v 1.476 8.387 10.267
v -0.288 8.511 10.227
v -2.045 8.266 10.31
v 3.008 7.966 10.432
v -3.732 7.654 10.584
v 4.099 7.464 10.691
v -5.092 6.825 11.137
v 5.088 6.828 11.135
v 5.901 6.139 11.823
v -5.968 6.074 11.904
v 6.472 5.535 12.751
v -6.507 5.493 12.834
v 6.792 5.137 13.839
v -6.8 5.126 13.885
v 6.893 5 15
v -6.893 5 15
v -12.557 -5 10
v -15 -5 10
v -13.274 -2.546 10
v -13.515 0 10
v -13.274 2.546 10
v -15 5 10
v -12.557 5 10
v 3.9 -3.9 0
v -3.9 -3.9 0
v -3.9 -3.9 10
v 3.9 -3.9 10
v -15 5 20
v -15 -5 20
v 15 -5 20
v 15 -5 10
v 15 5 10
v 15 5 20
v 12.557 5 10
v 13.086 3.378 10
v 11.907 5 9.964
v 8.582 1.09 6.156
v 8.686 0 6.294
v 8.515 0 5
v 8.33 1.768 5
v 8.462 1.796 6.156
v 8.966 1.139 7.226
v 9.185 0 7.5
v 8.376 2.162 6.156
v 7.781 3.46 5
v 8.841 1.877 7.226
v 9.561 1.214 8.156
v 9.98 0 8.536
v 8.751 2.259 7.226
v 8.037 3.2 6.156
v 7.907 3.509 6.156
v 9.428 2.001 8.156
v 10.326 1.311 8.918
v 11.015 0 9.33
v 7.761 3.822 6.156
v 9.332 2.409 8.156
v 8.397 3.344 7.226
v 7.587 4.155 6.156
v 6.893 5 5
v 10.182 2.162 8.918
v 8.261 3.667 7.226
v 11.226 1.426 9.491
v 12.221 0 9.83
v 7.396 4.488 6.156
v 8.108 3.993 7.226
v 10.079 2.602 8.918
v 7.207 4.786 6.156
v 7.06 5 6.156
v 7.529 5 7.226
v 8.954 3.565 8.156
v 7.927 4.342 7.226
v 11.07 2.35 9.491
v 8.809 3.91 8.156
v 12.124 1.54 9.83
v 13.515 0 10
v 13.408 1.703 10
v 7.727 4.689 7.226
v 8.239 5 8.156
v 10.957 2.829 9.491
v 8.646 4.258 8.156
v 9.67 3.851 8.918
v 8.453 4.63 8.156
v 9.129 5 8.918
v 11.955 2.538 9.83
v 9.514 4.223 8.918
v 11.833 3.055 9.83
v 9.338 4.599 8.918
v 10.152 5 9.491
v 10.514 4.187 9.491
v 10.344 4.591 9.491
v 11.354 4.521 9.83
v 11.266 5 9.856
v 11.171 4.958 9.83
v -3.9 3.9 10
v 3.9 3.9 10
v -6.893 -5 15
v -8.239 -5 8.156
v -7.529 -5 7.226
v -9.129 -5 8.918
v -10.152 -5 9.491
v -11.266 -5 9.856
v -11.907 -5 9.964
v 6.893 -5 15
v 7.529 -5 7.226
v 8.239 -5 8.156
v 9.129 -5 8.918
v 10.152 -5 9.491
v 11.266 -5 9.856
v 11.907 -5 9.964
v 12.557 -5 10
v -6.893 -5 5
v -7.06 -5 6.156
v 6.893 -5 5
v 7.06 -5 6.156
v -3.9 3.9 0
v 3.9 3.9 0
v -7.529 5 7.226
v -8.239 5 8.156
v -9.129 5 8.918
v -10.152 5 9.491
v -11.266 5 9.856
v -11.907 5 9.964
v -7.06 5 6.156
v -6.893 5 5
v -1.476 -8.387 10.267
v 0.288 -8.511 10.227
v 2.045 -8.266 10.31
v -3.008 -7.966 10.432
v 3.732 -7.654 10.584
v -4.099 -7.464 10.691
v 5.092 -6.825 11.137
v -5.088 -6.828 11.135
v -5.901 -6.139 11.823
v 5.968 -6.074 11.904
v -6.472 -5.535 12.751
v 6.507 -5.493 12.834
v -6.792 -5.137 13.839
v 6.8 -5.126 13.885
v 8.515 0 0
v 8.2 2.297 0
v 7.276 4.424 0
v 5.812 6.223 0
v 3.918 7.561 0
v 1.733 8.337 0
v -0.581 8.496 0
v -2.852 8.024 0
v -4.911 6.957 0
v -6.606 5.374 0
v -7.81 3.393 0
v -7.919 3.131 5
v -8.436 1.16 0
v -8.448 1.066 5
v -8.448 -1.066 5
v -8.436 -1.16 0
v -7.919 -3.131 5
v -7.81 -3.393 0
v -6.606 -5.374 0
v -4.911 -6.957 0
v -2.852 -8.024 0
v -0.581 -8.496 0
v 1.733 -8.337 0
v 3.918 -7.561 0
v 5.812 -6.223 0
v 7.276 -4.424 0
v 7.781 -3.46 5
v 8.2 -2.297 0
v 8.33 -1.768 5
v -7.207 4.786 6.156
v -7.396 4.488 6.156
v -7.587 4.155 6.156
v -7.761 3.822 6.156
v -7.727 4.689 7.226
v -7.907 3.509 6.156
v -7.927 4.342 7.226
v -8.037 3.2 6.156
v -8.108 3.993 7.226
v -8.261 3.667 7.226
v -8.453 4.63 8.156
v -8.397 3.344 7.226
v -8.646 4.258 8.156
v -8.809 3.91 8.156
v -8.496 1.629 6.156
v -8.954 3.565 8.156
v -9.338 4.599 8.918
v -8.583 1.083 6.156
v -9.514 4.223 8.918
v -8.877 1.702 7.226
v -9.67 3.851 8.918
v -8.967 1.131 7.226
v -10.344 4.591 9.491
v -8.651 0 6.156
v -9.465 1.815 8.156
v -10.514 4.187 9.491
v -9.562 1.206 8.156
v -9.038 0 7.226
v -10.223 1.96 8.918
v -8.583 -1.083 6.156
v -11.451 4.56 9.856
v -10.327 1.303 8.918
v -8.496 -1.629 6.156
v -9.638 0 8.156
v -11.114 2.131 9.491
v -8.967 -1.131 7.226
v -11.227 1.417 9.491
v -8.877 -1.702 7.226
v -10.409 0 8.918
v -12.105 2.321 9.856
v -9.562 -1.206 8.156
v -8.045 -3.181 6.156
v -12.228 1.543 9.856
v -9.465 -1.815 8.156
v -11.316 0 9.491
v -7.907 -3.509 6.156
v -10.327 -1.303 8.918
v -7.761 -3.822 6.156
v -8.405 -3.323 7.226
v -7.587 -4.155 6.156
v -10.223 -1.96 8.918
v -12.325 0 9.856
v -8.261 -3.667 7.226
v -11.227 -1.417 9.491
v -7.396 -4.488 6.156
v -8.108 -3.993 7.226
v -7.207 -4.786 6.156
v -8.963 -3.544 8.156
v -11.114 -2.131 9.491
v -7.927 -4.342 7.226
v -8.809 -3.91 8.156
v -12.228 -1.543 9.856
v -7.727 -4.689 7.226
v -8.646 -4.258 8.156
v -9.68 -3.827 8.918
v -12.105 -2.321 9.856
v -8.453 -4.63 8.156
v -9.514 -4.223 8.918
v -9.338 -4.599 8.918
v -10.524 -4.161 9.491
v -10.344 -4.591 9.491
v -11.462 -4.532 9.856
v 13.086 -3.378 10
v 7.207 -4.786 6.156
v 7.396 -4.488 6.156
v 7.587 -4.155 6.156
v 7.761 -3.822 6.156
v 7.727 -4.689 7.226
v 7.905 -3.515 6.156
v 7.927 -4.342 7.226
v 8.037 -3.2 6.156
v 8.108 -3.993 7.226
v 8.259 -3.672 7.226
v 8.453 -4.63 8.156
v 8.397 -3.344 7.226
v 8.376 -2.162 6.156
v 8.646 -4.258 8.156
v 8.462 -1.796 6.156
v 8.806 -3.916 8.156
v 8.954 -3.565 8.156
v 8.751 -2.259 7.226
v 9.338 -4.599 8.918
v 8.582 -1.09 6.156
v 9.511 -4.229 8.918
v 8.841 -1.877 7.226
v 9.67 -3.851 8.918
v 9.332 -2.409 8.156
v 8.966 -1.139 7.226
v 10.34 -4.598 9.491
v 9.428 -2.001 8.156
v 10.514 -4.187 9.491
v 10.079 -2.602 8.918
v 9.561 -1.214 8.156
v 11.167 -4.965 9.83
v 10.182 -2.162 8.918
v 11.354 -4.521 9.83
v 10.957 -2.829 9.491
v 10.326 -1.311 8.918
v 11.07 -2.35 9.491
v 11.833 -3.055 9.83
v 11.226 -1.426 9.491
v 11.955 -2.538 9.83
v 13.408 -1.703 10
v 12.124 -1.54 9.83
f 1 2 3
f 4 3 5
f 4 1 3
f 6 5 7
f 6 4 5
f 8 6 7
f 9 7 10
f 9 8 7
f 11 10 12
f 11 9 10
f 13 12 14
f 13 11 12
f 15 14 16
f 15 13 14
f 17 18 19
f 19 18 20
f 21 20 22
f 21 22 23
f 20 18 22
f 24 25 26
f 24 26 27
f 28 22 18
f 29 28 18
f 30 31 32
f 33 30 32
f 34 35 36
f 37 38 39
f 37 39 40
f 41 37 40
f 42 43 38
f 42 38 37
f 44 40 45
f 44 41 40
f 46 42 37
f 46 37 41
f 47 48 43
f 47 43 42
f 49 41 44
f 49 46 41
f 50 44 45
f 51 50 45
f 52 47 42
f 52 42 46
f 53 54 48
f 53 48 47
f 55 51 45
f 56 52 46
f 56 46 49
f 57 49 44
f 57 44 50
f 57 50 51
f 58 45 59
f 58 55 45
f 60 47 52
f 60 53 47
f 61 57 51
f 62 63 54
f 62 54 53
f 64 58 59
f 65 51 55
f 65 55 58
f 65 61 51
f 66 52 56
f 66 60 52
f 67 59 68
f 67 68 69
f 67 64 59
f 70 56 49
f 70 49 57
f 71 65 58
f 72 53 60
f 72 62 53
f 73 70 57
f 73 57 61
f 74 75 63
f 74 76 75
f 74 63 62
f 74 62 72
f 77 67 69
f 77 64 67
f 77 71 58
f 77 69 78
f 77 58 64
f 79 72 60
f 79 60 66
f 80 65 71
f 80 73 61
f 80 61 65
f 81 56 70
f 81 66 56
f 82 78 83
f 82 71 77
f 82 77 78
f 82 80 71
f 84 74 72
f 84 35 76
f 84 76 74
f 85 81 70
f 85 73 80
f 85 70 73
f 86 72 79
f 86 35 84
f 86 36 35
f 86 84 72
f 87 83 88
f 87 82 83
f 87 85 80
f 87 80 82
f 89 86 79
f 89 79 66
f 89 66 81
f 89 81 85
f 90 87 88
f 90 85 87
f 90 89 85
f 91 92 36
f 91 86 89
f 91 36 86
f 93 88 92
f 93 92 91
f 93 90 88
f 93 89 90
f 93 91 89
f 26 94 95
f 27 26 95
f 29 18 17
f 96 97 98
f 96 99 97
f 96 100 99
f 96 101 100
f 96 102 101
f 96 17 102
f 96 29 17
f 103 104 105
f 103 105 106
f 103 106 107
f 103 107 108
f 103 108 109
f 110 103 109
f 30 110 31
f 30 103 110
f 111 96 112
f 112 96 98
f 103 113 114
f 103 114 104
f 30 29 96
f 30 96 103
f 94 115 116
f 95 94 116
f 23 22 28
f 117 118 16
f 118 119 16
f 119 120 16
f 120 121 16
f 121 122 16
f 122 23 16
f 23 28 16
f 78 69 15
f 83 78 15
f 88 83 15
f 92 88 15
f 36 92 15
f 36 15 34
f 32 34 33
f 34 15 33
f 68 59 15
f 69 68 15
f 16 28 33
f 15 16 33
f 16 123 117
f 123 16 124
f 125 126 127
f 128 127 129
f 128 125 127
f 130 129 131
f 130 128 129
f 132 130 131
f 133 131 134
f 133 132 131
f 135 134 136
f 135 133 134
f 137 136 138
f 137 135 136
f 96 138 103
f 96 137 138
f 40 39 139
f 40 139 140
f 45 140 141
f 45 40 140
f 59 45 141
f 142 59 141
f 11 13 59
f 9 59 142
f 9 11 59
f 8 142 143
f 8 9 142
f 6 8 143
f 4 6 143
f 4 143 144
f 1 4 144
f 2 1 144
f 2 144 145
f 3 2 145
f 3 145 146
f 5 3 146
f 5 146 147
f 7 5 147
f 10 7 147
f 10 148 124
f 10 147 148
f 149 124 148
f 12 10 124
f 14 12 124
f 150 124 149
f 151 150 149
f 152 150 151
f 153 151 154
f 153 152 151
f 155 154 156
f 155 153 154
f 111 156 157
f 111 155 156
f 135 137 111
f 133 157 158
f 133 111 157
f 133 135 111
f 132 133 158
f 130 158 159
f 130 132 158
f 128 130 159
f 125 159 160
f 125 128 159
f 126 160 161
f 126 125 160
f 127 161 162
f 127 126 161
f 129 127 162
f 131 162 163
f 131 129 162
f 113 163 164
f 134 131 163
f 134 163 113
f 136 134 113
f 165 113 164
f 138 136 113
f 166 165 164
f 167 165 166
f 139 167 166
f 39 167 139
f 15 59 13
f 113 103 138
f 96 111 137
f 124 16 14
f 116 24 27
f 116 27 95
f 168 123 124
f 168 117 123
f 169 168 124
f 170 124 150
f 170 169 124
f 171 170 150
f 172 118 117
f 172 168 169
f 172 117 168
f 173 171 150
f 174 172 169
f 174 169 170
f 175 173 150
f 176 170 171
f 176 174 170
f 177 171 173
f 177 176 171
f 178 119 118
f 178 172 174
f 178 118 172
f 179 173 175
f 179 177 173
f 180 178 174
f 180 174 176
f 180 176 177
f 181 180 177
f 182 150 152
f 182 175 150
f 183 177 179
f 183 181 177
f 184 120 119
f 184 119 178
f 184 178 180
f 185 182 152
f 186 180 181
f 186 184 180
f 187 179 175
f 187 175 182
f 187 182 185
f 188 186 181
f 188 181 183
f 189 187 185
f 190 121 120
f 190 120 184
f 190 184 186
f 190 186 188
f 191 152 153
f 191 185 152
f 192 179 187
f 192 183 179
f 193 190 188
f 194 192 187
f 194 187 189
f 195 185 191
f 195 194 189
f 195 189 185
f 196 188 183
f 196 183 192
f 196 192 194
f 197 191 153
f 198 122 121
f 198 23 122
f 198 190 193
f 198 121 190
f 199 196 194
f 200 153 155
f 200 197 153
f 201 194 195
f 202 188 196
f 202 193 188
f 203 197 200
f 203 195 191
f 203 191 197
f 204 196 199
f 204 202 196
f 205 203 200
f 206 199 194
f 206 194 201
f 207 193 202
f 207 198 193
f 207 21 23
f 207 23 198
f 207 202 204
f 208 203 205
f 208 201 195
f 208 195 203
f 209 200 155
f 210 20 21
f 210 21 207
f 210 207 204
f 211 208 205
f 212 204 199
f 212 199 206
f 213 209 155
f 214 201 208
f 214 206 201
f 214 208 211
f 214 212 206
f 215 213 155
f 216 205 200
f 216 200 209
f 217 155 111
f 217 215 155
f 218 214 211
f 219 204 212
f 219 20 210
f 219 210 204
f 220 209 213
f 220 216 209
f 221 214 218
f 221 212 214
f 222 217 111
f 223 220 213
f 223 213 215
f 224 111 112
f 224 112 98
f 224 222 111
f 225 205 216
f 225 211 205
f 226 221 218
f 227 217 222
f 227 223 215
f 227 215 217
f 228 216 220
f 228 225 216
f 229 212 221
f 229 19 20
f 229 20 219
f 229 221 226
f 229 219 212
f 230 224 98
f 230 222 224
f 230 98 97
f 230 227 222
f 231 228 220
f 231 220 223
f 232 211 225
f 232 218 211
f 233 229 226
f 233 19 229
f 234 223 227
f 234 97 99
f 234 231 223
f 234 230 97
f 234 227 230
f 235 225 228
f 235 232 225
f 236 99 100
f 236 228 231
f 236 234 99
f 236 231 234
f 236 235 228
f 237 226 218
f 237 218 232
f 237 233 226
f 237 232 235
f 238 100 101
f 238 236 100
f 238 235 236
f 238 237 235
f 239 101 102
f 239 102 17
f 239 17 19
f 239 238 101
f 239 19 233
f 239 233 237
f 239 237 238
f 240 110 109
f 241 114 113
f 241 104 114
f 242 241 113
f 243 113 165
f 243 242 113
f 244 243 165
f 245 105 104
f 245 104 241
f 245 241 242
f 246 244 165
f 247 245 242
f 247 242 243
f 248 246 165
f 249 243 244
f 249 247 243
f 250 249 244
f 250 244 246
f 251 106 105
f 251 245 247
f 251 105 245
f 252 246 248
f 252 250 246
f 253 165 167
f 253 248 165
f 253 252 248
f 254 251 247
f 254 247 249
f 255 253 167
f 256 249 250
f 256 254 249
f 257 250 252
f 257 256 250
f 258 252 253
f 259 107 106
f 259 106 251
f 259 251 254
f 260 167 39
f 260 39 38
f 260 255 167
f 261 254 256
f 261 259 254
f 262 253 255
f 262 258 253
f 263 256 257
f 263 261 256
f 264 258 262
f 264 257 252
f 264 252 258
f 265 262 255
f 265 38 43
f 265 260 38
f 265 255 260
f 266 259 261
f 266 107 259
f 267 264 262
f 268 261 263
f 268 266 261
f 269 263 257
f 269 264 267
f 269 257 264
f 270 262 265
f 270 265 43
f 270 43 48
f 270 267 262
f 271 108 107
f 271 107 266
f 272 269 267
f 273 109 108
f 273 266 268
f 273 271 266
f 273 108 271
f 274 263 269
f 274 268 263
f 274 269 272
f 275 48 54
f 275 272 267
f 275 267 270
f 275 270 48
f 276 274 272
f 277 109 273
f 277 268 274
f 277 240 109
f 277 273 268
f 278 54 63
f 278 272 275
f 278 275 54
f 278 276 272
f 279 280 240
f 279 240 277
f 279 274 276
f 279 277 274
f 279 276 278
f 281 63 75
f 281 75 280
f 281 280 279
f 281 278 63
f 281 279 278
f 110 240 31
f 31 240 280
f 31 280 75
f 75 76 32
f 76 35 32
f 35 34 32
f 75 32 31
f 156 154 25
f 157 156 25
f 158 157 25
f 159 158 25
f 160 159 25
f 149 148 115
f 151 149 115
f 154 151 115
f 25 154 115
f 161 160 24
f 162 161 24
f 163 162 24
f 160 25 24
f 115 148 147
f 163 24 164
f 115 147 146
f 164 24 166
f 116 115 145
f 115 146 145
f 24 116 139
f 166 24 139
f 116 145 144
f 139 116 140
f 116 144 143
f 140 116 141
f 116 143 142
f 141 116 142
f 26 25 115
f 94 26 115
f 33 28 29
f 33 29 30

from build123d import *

# Parameters (mm, degrees)
F0_R         = 8.5154328933
F0_W         = 7.8
F0_H         = 7.8
F1_DEPTH     = 10
F2_W         = 7.8
F2_H         = 7.8
F3_DEPTH     = 10
F4_T4_DEPTH  = 38.7858764479
F4_S5_R      = 8.5154328933
F4_T6_DEPTH  = 21
F4_T10_DEPTH = 38.7858764479
F4_S11_R     = 8.5154328933
F4_T12_DEPTH = 21
F4_T16_ANGLE = 120.0675682876
F4_T21_ANGLE = 240.167490735
F4_T27_ANGLE = 120.0675682876


# Not quite as in the source:
# - a fillet or chamfer that OpenCascade refuses, or shapes differently, is made with other operations: its cross-section is extruded or revolved along the edge and cut away or added
# - two fillets or chamfers of one size are made in one step


with BuildPart() as f1:
    # F0 (on Top) → F1 (new body)
    with BuildSketch(Plane.XY):
        Circle(F0_R)
        Rectangle(F0_W, F0_H, mode=Mode.SUBTRACT)
    extrude(amount=F1_DEPTH)

    # F2 (on face) → F3 (join)
    with BuildSketch(Plane.XY.offset(10)):
        with BuildLine():
            Line((6.892938224, 5), (-6.892938224, 5))
            ThreePointArc((-6.892938224, 5), (-8.5154328933, 0), (-6.892938224, -5))
            Line((-6.892938224, -5), (6.892938224, -5))
            ThreePointArc((6.892938224, -5), (8.0996589509, -2.6283306942), (8.5154328933, 0))
            ThreePointArc((8.5154328933, 0), (8.0996589509, 2.6283306942), (6.892938224, 5))
        make_face()
        Rectangle(F2_W, F2_H, mode=Mode.SUBTRACT)
        with BuildLine():
            Line((-6.892938224, 5), (-15, 5))
            Line((-15, 5), (-15, -5))
            Line((-15, -5), (-6.892938224, -5))
            ThreePointArc((-6.892938224, -5), (-8.5154328933, 0), (-6.892938224, 5))
        make_face()
        with BuildLine():
            Line((15, 5), (6.892938224, 5))
            ThreePointArc((6.892938224, 5), (8.0996589509, 2.6283306942), (8.5154328933, 0))
            ThreePointArc((8.5154328933, 0), (8.0996589509, -2.6283306942), (6.892938224, -5))
            Line((6.892938224, -5), (15, -5))
            Line((15, -5), (15, 5))
        make_face()
        Rectangle(F2_W, F2_H)
    extrude(amount=F3_DEPTH)

    # F4: fillet of radius 5 on 5 edges, made by hand


with BuildPart() as f4_tool2:
    # F4_s3 → F4_t4 (new body)
    with BuildSketch(Plane.YZ.offset(-19.392938224)):
        with BuildLine():
            ThreePointArc((-10, 10), (-6.4644660941, 11.4644660941), (-5, 15))
            Line((-5, 15), (-5, 10))
            Line((-5, 10), (-10, 10))
        make_face()
    extrude(amount=F4_T4_DEPTH)

    # F4_s5 → F4_t6 (intersect, symmetric)
    with BuildSketch(Plane.XY.offset(12.5)):
        Circle(F4_S5_R)
    extrude(amount=F4_T6_DEPTH, both=True, mode=Mode.INTERSECT)


with BuildPart() as f1_1:
    add(f1.part)

    # F4_t1: union F4_tool2
    add(f4_tool2.part)


with BuildPart() as f4_tool8:
    # F4_s9 → F4_t10 (new body)
    with BuildSketch(Plane.YZ.offset(19.392938224)):
        with BuildLine():
            ThreePointArc((10, 10), (6.4644660941, 11.4644660941), (5, 15))
            Line((5, 15), (5, 10))
            Line((5, 10), (10, 10))
        make_face()
    extrude(amount=-F4_T10_DEPTH)

    # F4_s11 → F4_t12 (intersect, symmetric)
    with BuildSketch(Plane.XY.offset(12.5)):
        Circle(F4_S11_R)
    extrude(amount=F4_T12_DEPTH, both=True, mode=Mode.INTERSECT)


with BuildPart() as f1_2:
    add(f1_1.part)

    # F4_t7: union F4_tool8
    add(f4_tool8.part)


with BuildPart() as f4_tool14:
    # F4_s15 → F4_t16 (revolve)
    with BuildSketch(Plane(origin=(0, 0, 0), x_dir=(0, 0, 1), z_dir=(-0.8654351572, 0.5010209464, 0))):
        with BuildLine():
            ThreePointArc((5, -8.5154328933), (8.5355339059, -9.9798989873), (10, -13.5154328933))
            Line((10, -13.5154328933), (10, -8.5154328933))
            Line((10, -8.5154328933), (5, -8.5154328933))
        make_face()
    revolve(axis=Axis((0, 0, 10), (0, 0, 1)), revolution_arc=F4_T16_ANGLE)

    split(bisect_by=Plane.XZ.offset(5), keep=Keep.BOTTOM)


with BuildPart() as f1_3:
    add(f1_2.part)

    # F4_t13: union F4_tool14
    add(f4_tool14.part)


with BuildPart() as f4_tool19:
    # F4_s20 → F4_t21 (revolve)
    with BuildSketch(Plane(origin=(0, 0, 0), x_dir=(0, 0, 1), z_dir=(0.8652936628, -0.5012652762, 0))):
        with BuildLine():
            ThreePointArc((5, -8.5154328933), (8.5355339059, -9.9798989873), (10, -13.5154328933))
            Line((10, -13.5154328933), (10, -8.5154328933))
            Line((10, -8.5154328933), (5, -8.5154328933))
        make_face()
    revolve(axis=Axis((0, 0, 10), (0, 0, 1)), revolution_arc=F4_T21_ANGLE)

    split(bisect_by=Plane.XZ.offset(-5), keep=Keep.TOP)

    split(bisect_by=Plane.XZ.offset(5), keep=Keep.BOTTOM)


with BuildPart() as f1_4:
    add(f1_3.part)

    # F4_t18: union F4_tool19
    add(f4_tool19.part)


with BuildPart() as f4_tool25:
    # F4_s26 → F4_t27 (revolve)
    with BuildSketch(Plane.XZ):
        with BuildLine():
            ThreePointArc((8.5154328933, 5), (9.9798989873, 8.5355339059), (13.5154328933, 10))
            Line((13.5154328933, 10), (8.5154328933, 10))
            Line((8.5154328933, 10), (8.5154328933, 5))
        make_face()
    revolve(axis=Axis((0, 0, 10), (0, 0, 1)), revolution_arc=F4_T27_ANGLE)

    split(bisect_by=Plane.XZ.offset(-5), keep=Keep.TOP)


with BuildPart() as f1_5:
    add(f1_4.part)

    # F4_t24: union F4_tool25
    add(f4_tool25.part)


solid = f1_5.part
